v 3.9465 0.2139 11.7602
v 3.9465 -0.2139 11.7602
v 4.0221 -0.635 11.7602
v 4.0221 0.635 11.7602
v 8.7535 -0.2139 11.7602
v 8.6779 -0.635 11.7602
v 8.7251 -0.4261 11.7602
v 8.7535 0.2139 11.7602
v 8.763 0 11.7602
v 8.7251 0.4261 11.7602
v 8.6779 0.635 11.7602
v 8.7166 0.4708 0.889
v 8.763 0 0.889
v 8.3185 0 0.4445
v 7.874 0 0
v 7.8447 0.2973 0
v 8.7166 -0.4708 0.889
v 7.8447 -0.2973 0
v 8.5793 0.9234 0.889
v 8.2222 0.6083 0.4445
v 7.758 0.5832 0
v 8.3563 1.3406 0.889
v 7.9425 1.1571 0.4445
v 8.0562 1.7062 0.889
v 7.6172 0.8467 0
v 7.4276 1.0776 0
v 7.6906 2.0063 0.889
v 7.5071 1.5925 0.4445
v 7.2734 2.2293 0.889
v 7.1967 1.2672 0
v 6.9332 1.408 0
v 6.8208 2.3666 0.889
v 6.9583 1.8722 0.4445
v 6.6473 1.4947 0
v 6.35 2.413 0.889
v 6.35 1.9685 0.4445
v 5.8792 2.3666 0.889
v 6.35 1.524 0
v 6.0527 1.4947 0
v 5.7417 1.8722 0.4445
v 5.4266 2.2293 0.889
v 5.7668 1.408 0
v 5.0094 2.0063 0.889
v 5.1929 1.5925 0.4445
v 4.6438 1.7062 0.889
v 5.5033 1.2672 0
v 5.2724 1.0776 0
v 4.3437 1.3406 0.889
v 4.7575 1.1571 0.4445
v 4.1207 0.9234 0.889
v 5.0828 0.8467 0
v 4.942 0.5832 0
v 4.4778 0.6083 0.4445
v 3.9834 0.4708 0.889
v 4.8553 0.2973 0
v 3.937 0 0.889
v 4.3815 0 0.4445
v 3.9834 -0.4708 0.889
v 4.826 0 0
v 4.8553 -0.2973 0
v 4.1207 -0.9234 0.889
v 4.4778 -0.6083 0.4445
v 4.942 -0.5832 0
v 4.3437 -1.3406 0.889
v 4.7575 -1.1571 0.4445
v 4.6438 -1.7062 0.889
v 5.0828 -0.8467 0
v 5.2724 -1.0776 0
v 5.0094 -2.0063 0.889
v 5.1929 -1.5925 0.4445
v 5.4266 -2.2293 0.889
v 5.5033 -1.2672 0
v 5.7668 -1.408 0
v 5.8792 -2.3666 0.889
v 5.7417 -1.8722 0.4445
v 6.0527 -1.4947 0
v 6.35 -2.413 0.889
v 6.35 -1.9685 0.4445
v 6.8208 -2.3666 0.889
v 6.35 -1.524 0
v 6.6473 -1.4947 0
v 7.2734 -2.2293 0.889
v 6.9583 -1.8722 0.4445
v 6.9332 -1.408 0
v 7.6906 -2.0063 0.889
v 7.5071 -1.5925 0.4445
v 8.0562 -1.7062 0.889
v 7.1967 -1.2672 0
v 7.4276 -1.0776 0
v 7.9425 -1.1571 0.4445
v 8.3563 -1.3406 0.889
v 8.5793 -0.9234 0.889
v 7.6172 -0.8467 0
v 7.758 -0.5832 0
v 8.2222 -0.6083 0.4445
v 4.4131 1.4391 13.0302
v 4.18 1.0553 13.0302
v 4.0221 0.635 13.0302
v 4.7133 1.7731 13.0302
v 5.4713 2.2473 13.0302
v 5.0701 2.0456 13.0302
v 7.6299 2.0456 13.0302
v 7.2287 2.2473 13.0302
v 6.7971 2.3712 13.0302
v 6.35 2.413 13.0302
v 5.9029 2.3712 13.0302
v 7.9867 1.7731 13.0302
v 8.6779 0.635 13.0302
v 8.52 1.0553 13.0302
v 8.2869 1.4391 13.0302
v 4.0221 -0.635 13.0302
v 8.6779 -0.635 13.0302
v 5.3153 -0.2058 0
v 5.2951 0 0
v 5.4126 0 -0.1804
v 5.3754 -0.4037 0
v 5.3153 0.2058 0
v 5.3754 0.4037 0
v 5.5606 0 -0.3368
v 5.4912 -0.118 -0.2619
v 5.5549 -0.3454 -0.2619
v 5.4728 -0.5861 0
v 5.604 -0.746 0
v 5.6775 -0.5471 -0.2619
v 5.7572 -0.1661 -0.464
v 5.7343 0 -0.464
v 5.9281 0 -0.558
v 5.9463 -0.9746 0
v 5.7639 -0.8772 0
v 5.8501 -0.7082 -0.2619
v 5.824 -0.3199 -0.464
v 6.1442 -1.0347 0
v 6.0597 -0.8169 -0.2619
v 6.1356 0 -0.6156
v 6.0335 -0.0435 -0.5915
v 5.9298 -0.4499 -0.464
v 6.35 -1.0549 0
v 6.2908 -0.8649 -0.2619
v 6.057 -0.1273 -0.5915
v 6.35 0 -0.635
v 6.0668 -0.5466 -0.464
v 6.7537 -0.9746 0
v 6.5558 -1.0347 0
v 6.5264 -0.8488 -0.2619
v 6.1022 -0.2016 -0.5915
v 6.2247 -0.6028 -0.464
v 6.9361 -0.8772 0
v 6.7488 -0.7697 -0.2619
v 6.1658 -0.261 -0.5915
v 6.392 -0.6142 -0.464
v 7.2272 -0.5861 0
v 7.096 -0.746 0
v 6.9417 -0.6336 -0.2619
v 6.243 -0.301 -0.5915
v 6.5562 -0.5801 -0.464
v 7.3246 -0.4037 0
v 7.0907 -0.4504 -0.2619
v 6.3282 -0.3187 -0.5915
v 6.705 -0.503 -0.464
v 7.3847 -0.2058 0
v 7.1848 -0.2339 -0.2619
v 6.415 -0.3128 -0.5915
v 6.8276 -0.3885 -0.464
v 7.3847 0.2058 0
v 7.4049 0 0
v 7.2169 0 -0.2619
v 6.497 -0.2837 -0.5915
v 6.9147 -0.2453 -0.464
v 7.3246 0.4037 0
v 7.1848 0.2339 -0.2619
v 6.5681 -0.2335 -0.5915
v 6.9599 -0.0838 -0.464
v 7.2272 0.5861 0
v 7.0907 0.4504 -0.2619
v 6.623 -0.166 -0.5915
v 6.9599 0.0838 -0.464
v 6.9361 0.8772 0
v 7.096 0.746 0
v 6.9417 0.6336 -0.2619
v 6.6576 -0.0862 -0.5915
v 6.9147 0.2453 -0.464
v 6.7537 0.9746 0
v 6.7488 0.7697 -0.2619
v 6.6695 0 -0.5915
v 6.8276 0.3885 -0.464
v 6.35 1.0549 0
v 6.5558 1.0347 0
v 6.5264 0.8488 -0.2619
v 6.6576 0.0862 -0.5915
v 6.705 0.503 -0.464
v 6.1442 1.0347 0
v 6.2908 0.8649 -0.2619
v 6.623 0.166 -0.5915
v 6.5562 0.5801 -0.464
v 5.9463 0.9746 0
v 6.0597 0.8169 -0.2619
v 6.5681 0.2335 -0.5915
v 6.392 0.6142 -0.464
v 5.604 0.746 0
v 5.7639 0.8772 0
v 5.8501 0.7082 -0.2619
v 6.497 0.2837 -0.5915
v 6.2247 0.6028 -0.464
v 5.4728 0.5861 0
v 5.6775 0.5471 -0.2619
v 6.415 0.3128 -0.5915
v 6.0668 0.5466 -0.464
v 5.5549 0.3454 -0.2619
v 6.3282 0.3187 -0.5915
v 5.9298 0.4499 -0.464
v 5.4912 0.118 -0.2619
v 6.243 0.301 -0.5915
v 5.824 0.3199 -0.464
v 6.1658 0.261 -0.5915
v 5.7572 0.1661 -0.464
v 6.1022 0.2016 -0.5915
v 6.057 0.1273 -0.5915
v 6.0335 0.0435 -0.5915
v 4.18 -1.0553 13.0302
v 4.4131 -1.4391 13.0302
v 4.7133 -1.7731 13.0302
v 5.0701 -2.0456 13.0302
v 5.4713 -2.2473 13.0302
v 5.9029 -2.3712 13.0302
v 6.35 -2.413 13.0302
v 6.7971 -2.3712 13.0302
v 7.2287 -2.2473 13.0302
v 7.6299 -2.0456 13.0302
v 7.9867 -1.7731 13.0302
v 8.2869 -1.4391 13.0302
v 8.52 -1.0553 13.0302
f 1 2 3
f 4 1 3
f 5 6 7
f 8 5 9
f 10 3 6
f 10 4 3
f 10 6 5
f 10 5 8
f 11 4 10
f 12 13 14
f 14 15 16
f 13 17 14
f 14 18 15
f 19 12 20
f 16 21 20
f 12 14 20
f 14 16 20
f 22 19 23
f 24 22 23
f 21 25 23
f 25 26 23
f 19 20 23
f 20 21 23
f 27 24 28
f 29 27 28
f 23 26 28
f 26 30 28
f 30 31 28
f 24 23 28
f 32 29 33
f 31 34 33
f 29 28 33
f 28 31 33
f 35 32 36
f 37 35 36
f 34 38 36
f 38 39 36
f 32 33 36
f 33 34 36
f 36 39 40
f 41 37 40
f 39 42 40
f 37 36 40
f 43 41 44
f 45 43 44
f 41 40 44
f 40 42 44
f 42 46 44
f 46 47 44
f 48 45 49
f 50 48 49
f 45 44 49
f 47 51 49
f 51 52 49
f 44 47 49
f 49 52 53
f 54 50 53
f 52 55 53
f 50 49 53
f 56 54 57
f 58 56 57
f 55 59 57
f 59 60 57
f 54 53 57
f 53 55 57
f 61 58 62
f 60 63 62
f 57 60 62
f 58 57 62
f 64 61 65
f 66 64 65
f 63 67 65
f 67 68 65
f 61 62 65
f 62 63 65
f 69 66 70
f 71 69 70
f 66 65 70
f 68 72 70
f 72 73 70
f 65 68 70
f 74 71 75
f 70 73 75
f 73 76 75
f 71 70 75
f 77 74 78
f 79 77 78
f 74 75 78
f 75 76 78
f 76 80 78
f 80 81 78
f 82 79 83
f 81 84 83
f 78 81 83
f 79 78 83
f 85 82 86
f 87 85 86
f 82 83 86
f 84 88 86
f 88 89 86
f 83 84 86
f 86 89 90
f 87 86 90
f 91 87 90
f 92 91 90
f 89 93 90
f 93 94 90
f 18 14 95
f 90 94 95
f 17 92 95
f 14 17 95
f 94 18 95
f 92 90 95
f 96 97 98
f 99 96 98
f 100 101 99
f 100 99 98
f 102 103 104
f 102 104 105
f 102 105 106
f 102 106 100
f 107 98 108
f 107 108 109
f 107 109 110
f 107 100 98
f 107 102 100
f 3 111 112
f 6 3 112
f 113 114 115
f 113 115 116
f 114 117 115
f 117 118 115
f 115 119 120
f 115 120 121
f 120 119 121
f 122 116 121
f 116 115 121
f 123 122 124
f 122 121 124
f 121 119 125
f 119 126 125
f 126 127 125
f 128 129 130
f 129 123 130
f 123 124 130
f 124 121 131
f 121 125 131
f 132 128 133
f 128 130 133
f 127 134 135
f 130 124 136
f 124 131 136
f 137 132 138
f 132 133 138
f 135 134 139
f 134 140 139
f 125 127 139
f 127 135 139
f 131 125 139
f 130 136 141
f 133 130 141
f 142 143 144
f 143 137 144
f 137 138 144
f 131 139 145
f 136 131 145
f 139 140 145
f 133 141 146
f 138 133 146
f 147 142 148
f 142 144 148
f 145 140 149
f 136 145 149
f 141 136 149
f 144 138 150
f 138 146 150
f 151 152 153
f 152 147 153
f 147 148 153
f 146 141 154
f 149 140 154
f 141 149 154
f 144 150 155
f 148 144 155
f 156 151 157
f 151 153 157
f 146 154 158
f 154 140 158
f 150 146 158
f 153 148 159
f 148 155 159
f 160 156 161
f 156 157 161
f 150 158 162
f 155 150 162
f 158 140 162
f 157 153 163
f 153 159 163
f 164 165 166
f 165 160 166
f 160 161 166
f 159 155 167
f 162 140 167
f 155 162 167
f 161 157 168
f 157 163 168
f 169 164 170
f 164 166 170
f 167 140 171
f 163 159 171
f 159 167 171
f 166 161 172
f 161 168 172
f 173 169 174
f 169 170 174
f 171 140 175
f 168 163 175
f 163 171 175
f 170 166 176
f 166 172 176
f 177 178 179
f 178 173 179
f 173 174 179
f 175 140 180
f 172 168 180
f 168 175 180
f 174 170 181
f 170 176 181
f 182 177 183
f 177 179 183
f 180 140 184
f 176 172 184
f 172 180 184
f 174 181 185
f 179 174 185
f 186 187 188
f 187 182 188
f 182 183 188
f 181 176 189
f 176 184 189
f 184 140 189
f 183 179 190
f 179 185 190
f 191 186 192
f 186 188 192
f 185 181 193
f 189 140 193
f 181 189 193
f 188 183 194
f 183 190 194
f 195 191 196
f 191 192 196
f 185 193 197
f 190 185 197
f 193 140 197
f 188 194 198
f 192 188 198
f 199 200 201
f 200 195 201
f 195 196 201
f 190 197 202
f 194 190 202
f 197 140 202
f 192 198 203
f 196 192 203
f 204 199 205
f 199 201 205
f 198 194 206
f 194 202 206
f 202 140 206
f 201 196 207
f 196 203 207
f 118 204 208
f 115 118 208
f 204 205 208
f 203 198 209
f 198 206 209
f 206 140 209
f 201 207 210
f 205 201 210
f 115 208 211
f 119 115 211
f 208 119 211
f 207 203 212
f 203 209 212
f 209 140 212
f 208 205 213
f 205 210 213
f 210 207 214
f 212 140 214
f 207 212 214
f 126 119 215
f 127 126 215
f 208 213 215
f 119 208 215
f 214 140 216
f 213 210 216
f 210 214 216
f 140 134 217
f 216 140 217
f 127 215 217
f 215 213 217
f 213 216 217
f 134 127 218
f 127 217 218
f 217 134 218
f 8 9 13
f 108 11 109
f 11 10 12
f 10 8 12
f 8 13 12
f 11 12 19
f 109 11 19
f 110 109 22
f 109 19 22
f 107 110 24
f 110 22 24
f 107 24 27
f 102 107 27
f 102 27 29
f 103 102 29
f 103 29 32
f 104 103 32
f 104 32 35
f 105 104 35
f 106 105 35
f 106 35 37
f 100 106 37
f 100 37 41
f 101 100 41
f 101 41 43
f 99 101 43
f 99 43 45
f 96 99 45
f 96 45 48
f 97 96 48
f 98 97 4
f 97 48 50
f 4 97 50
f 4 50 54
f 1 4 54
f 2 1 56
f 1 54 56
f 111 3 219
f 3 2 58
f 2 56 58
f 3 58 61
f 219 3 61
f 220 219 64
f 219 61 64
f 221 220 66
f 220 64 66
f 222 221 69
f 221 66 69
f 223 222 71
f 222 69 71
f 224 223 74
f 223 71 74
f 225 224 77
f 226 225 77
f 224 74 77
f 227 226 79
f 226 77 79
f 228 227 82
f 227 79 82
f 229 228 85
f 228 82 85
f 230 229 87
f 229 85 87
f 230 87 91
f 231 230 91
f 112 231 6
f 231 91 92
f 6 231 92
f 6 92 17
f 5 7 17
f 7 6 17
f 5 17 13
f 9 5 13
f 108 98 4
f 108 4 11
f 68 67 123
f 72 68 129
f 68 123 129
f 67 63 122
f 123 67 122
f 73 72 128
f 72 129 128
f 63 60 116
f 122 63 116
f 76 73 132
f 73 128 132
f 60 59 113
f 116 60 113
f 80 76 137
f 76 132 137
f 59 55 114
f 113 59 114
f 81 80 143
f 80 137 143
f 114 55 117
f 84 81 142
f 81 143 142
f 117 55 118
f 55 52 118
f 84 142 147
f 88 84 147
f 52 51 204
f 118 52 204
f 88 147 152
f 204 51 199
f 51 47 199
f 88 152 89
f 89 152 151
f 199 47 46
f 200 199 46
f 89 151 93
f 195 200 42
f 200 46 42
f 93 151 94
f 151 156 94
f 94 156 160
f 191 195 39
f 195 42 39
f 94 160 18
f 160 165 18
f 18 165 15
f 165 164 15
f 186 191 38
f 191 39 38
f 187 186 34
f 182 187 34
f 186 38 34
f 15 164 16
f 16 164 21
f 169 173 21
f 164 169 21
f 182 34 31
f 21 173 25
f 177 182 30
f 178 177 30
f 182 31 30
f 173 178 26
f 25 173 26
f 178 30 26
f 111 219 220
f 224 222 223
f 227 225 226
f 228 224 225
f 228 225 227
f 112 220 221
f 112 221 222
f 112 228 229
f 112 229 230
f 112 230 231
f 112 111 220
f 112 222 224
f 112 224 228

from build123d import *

# Parameters (mm, degrees)
SKETCH1_R          = 2.413
EXTRUDE1_DEPTH     = 13.0302
CHAMFER1_SIZE      = 0.889
SKETCH3_W          = 4.826
SKETCH3_H          = 1.27
CUT_EXTRUDE1_DEPTH = 1.27


with BuildPart() as part:
    # Sketch1 → Extrude1 (new body)
    with BuildSketch(Plane.XY):
        with Locations((6.35, 0)):
            Circle(SKETCH1_R)
    extrude(amount=EXTRUDE1_DEPTH)

    # Chamfer1
    chamfer1_edges = [part.edges().sort_by_distance(p)[0] for p in [
        (3.937, 0, 0),
    ]]
    chamfer(chamfer1_edges, length=CHAMFER1_SIZE)

    # Sketch3 → Cut-Extrude1 (cut)
    with BuildSketch(Plane.XY.offset(13.0302)):
        with Locations((6.35, 0)):
            Rectangle(SKETCH3_W, SKETCH3_H)
    extrude(amount=-CUT_EXTRUDE1_DEPTH, mode=Mode.SUBTRACT)

    # Sketch4 → Revolve3 (revolve)
    with BuildSketch(Plane(origin=(0, 0, 0), x_dir=(1, 0, 0), z_dir=(0, 1, 0))):
        with BuildLine():
            Line((6.35, 0.635), (6.35, -1.7526))
            ThreePointArc((6.35, -1.7526), (5.1562, -0.5588), (6.35, 0.635))
        make_face()
    revolve(axis=Axis((6.35, 0, -0.635), (0, 0, 1)))


solid = part.part
